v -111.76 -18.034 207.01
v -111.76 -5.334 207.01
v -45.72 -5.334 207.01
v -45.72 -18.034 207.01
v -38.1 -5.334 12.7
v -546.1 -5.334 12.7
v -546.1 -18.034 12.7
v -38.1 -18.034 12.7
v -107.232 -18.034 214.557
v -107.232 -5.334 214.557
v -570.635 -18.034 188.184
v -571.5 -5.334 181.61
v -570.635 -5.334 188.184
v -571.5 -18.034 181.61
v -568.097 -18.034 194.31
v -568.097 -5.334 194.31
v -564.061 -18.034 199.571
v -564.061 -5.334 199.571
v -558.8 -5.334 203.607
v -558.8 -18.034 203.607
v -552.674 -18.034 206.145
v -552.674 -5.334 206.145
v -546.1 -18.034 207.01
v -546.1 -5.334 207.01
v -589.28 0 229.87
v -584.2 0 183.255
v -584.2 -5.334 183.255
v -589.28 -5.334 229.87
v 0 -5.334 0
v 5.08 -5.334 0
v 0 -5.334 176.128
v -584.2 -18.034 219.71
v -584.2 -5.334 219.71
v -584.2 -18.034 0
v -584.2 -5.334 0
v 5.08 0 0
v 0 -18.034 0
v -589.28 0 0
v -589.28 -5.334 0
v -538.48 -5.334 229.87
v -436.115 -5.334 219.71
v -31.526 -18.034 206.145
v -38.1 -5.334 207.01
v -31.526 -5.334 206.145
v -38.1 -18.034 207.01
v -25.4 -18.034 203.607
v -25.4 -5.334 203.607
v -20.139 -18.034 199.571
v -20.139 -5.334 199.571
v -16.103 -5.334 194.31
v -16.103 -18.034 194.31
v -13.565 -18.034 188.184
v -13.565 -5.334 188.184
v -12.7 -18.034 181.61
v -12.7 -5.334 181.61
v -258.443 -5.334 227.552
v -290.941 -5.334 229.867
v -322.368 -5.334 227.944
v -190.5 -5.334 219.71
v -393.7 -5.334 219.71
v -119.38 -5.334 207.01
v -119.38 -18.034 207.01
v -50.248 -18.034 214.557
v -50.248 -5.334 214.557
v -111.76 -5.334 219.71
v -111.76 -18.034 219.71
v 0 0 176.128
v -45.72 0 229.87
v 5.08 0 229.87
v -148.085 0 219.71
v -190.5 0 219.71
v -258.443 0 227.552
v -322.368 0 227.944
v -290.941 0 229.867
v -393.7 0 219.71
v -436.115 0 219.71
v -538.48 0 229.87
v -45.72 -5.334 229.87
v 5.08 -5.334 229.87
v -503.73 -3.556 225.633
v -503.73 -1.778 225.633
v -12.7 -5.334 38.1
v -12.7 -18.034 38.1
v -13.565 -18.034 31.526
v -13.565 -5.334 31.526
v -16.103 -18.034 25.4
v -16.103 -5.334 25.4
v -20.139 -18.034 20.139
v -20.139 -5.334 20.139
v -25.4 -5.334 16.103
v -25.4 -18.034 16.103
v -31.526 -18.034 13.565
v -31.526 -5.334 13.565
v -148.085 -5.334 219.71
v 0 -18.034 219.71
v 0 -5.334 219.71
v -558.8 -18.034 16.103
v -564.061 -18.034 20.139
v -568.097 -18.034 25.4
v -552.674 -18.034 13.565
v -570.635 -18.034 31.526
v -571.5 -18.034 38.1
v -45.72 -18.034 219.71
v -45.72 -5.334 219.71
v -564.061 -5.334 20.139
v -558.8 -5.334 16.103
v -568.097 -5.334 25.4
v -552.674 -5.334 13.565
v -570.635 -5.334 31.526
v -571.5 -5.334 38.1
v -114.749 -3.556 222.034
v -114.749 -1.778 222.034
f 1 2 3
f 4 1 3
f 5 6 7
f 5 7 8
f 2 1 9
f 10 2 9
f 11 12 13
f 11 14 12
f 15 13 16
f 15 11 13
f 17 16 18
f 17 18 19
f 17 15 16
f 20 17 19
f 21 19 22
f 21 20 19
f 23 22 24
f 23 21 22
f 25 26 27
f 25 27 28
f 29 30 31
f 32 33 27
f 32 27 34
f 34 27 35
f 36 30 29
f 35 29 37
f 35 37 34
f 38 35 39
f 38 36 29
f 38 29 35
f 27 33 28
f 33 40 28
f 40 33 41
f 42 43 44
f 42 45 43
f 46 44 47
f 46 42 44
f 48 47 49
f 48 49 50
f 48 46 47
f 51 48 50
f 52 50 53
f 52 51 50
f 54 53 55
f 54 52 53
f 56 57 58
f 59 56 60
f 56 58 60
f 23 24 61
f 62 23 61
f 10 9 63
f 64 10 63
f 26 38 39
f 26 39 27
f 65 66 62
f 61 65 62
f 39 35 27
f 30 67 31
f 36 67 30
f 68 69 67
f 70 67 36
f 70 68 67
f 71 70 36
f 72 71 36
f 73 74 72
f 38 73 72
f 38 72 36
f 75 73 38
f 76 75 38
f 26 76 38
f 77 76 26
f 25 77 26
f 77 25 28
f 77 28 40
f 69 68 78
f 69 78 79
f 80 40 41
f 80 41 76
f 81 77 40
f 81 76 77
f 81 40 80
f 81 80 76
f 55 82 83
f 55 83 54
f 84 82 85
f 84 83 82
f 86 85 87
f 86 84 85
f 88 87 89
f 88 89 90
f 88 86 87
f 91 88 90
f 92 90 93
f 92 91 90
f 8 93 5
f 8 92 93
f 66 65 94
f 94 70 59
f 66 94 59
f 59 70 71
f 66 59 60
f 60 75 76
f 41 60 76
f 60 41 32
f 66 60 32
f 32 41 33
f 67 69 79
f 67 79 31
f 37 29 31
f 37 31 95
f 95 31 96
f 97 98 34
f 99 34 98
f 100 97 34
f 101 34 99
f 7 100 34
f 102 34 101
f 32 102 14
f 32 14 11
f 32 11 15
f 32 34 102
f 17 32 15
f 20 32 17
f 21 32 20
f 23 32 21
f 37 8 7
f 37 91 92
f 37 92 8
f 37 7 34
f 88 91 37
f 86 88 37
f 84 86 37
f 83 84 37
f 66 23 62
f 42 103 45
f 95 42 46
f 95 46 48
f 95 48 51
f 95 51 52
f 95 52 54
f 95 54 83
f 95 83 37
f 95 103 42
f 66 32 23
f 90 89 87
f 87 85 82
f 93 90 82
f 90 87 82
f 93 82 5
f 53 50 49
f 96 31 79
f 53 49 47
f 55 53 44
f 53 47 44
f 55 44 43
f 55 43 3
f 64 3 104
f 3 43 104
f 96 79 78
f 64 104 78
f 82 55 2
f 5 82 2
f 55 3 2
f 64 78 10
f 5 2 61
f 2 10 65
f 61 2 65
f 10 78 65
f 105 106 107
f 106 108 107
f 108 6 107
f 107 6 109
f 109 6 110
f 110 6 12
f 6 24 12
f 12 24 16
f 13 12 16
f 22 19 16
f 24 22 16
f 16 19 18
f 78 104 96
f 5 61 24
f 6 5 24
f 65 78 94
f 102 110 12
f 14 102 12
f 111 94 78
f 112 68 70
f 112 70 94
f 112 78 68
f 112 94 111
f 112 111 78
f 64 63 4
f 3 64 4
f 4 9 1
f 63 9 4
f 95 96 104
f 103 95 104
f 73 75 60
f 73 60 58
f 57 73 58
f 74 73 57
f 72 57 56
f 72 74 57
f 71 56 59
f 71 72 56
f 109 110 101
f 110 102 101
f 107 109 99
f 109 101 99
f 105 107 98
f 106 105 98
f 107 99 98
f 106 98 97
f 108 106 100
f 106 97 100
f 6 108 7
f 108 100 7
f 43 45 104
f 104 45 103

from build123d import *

# Parameters (mm, degrees)
F0_W     = 584.2
F0_H     = 219.71
F1_DEPTH = 5.334
F2_W     = 558.8
F2_H     = 194.31
F3_DEPTH = 12.7
F4_R     = 25.4
F6_DEPTH = 12.7
F8_DEPTH = 5.334


# Not quite as in the source:
# - a feature names something its author has since deleted; it is built from what else it names


with BuildPart() as f1:
    # F0 (on Front) → F1 (new body)
    with BuildSketch(Plane.XZ):
        with Locations((-292.1, 109.855)):
            Rectangle(F0_W, F0_H)
    extrude(amount=F1_DEPTH)

    # F2 (on face) → F3 (join)
    with BuildSketch(Plane.XZ.offset(5.334)):
        Polygon((0, 219.71), (-6.35, 219.71), (-577.85, 219.71), (-584.2, 219.71), (-584.2, 0), (0, 0), align=None)
        with Locations((-292.1, 109.855)):
            Rectangle(F2_W, F2_H, mode=Mode.SUBTRACT)
    extrude(amount=F3_DEPTH)

    # F4
    f4_edges = [f1.edges().sort_by_distance(p)[0] for p in [
        (-571.5, -11.684, 207.01),
        (-12.7, -11.684, 207.01),
        (-12.7, -11.684, 12.7),
        (-571.5, -11.684, 12.7),
    ]]
    fillet(f4_edges, radius=F4_R)

    # F5 (on face) → F6 (cut)
    with BuildSketch(Plane.XZ.offset(18.034)):
        Polygon((-104.14, 219.71), (-111.76, 219.71), (-119.38, 207.01), (-111.76, 207.01), (-107.2320166854, 214.5566388576), align=None)
        Polygon((-38.1, 207.01), (-45.72, 219.71), (-53.34, 219.71), (-50.2479833146, 214.5566388576), (-45.72, 207.01), align=None)
        Polygon((-53.34, 219.71), (-104.14, 219.71), (-107.2320166854, 214.5566388576), (-50.2479833146, 214.5566388576), align=None)
    extrude(amount=-F6_DEPTH, mode=Mode.SUBTRACT)

    # F7 (on face) → F8 (join)
    with BuildSketch(Plane(origin=(0, 0, 0), x_dir=(-1, 0, 0), z_dir=(0, 1, 0))):
        with BuildLine():
            Line((-5.08, 229.87), (0, 176.1275827885))
            Line((0, 176.1275827885), (0, 219.71))
            Line((0, 219.71), (148.0852009026, 219.71))
            add(Edge.make_bspline(
                [(148.0852009026, 219.71), (115.3779899576, 221.1840971885), (80.5489949788, 225.5270485943), (45.72, 229.87)],
                knots=[0.812101374, 0.812101374, 0.812101374, 0.812101374, 1, 1, 1, 1], degree=3))
            Line((45.72, 229.87), (-5.08, 229.87))
        make_face()
        with BuildLine():
            add(Edge.make_bspline(
                [(393.7, 219.71), (356.8171998762, 221.731425099), (324.4585999381, 229.87), (292.1, 229.87)],
                knots=[0.2719218593, 0.2719218593, 0.2719218593, 0.2719218593, 0.5, 0.5, 0.5, 0.5], degree=3))
            add(Edge.make_bspline(
                [(292.1, 229.87), (259.7414000619, 229.87), (227.3828001238, 221.731425099), (190.5, 219.71)],
                knots=[0.5, 0.5, 0.5, 0.5, 0.7280781407, 0.7280781407, 0.7280781407, 0.7280781407], degree=3))
            Line((190.5, 219.71), (393.7, 219.71))
        make_face()
        Polygon((584.2, 183.2547038794), (584.2, 0), (589.28, 0), align=None)
        with BuildLine():
            Line((584.2, 219.71), (584.2, 183.2547038794))
            Line((584.2, 183.2547038794), (589.28, 229.87))
            Line((589.28, 229.87), (538.48, 229.87))
            add(Edge.make_bspline(
                [(538.48, 229.87), (503.6510050212, 225.5270485943), (468.8220100424, 221.1840971885), (436.1147990974, 219.71)],
                knots=[0, 0, 0, 0, 0.187898626, 0.187898626, 0.187898626, 0.187898626], degree=3))
            Line((436.1147990974, 219.71), (584.2, 219.71))
        make_face()
        Polygon((-5.08, 0), (0, 0), (0, 176.1275827885), align=None)
    extrude(amount=-F8_DEPTH)


solid = f1.part
